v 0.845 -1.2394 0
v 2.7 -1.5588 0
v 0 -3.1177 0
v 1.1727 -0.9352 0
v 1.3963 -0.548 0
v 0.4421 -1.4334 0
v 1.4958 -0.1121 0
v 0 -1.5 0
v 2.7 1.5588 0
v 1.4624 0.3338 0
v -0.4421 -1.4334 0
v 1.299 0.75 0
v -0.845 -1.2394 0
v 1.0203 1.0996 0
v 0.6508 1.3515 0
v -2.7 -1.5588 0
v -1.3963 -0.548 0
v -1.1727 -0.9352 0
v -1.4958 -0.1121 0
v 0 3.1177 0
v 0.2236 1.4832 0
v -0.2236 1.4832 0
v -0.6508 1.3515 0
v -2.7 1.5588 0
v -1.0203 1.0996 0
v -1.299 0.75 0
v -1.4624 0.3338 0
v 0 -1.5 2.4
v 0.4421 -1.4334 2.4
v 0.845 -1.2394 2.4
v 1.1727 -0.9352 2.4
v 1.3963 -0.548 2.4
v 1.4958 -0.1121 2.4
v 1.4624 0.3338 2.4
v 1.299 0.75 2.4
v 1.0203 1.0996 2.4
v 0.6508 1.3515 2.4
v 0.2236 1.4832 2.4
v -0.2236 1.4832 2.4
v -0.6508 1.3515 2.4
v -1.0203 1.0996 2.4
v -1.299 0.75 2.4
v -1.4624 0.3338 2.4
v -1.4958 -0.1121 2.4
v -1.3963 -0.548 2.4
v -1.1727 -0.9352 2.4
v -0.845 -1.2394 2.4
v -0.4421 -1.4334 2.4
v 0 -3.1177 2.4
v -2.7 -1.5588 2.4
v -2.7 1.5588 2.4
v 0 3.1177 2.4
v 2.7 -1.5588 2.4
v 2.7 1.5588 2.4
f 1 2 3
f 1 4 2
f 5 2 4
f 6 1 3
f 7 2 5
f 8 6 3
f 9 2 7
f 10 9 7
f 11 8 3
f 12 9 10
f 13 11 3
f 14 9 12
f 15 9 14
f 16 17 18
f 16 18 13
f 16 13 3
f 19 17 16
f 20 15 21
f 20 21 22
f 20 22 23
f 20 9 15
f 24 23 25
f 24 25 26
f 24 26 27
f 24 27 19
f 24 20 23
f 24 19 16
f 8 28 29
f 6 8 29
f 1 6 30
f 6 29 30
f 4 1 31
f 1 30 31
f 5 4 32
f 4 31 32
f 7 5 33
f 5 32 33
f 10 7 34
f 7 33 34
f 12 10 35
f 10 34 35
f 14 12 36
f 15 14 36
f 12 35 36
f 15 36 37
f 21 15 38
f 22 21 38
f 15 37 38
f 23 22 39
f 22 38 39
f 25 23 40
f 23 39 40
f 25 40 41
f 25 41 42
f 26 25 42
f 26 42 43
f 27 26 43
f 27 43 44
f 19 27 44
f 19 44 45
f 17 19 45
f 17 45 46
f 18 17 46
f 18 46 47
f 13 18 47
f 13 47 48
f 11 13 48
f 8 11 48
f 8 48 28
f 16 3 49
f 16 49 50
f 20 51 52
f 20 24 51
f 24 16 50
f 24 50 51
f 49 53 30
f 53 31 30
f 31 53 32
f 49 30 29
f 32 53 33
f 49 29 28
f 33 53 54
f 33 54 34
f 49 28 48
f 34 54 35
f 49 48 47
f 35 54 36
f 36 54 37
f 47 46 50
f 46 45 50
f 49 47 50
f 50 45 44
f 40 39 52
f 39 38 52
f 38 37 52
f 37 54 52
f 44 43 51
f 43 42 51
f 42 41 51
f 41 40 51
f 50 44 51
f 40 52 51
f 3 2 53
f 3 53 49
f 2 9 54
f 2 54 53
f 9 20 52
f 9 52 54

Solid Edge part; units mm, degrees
sketch "Sketch1" plane through (0, 0, 0) normal (0, 0, 1) x (1, 0, 0)
  line L0 (0, 3.1177) -> (2.7, 1.5588)
  line L1 (2.7, 1.5588) -> (2.7, -1.5588)
  line L2 (2.7, -1.5588) -> (0, -3.1177)
  line L3 (0, -3.1177) -> (-2.7, -1.5588)
  line L4 (-2.7, -1.5588) -> (-2.7, 1.5588)
  line L5 (-2.7, 1.5588) -> (0, 3.1177)
  dimension "D1" = 5.4
  dimension "D2" = 5.4
  dimension "D3" = 5.4
extrude "Protrusion1" add sketch "Sketch1" along normal blind 2.4
hole "Hole_1" at (0, 0, 2.4) direction (0, 0, -1) diameter 3 end up to next
